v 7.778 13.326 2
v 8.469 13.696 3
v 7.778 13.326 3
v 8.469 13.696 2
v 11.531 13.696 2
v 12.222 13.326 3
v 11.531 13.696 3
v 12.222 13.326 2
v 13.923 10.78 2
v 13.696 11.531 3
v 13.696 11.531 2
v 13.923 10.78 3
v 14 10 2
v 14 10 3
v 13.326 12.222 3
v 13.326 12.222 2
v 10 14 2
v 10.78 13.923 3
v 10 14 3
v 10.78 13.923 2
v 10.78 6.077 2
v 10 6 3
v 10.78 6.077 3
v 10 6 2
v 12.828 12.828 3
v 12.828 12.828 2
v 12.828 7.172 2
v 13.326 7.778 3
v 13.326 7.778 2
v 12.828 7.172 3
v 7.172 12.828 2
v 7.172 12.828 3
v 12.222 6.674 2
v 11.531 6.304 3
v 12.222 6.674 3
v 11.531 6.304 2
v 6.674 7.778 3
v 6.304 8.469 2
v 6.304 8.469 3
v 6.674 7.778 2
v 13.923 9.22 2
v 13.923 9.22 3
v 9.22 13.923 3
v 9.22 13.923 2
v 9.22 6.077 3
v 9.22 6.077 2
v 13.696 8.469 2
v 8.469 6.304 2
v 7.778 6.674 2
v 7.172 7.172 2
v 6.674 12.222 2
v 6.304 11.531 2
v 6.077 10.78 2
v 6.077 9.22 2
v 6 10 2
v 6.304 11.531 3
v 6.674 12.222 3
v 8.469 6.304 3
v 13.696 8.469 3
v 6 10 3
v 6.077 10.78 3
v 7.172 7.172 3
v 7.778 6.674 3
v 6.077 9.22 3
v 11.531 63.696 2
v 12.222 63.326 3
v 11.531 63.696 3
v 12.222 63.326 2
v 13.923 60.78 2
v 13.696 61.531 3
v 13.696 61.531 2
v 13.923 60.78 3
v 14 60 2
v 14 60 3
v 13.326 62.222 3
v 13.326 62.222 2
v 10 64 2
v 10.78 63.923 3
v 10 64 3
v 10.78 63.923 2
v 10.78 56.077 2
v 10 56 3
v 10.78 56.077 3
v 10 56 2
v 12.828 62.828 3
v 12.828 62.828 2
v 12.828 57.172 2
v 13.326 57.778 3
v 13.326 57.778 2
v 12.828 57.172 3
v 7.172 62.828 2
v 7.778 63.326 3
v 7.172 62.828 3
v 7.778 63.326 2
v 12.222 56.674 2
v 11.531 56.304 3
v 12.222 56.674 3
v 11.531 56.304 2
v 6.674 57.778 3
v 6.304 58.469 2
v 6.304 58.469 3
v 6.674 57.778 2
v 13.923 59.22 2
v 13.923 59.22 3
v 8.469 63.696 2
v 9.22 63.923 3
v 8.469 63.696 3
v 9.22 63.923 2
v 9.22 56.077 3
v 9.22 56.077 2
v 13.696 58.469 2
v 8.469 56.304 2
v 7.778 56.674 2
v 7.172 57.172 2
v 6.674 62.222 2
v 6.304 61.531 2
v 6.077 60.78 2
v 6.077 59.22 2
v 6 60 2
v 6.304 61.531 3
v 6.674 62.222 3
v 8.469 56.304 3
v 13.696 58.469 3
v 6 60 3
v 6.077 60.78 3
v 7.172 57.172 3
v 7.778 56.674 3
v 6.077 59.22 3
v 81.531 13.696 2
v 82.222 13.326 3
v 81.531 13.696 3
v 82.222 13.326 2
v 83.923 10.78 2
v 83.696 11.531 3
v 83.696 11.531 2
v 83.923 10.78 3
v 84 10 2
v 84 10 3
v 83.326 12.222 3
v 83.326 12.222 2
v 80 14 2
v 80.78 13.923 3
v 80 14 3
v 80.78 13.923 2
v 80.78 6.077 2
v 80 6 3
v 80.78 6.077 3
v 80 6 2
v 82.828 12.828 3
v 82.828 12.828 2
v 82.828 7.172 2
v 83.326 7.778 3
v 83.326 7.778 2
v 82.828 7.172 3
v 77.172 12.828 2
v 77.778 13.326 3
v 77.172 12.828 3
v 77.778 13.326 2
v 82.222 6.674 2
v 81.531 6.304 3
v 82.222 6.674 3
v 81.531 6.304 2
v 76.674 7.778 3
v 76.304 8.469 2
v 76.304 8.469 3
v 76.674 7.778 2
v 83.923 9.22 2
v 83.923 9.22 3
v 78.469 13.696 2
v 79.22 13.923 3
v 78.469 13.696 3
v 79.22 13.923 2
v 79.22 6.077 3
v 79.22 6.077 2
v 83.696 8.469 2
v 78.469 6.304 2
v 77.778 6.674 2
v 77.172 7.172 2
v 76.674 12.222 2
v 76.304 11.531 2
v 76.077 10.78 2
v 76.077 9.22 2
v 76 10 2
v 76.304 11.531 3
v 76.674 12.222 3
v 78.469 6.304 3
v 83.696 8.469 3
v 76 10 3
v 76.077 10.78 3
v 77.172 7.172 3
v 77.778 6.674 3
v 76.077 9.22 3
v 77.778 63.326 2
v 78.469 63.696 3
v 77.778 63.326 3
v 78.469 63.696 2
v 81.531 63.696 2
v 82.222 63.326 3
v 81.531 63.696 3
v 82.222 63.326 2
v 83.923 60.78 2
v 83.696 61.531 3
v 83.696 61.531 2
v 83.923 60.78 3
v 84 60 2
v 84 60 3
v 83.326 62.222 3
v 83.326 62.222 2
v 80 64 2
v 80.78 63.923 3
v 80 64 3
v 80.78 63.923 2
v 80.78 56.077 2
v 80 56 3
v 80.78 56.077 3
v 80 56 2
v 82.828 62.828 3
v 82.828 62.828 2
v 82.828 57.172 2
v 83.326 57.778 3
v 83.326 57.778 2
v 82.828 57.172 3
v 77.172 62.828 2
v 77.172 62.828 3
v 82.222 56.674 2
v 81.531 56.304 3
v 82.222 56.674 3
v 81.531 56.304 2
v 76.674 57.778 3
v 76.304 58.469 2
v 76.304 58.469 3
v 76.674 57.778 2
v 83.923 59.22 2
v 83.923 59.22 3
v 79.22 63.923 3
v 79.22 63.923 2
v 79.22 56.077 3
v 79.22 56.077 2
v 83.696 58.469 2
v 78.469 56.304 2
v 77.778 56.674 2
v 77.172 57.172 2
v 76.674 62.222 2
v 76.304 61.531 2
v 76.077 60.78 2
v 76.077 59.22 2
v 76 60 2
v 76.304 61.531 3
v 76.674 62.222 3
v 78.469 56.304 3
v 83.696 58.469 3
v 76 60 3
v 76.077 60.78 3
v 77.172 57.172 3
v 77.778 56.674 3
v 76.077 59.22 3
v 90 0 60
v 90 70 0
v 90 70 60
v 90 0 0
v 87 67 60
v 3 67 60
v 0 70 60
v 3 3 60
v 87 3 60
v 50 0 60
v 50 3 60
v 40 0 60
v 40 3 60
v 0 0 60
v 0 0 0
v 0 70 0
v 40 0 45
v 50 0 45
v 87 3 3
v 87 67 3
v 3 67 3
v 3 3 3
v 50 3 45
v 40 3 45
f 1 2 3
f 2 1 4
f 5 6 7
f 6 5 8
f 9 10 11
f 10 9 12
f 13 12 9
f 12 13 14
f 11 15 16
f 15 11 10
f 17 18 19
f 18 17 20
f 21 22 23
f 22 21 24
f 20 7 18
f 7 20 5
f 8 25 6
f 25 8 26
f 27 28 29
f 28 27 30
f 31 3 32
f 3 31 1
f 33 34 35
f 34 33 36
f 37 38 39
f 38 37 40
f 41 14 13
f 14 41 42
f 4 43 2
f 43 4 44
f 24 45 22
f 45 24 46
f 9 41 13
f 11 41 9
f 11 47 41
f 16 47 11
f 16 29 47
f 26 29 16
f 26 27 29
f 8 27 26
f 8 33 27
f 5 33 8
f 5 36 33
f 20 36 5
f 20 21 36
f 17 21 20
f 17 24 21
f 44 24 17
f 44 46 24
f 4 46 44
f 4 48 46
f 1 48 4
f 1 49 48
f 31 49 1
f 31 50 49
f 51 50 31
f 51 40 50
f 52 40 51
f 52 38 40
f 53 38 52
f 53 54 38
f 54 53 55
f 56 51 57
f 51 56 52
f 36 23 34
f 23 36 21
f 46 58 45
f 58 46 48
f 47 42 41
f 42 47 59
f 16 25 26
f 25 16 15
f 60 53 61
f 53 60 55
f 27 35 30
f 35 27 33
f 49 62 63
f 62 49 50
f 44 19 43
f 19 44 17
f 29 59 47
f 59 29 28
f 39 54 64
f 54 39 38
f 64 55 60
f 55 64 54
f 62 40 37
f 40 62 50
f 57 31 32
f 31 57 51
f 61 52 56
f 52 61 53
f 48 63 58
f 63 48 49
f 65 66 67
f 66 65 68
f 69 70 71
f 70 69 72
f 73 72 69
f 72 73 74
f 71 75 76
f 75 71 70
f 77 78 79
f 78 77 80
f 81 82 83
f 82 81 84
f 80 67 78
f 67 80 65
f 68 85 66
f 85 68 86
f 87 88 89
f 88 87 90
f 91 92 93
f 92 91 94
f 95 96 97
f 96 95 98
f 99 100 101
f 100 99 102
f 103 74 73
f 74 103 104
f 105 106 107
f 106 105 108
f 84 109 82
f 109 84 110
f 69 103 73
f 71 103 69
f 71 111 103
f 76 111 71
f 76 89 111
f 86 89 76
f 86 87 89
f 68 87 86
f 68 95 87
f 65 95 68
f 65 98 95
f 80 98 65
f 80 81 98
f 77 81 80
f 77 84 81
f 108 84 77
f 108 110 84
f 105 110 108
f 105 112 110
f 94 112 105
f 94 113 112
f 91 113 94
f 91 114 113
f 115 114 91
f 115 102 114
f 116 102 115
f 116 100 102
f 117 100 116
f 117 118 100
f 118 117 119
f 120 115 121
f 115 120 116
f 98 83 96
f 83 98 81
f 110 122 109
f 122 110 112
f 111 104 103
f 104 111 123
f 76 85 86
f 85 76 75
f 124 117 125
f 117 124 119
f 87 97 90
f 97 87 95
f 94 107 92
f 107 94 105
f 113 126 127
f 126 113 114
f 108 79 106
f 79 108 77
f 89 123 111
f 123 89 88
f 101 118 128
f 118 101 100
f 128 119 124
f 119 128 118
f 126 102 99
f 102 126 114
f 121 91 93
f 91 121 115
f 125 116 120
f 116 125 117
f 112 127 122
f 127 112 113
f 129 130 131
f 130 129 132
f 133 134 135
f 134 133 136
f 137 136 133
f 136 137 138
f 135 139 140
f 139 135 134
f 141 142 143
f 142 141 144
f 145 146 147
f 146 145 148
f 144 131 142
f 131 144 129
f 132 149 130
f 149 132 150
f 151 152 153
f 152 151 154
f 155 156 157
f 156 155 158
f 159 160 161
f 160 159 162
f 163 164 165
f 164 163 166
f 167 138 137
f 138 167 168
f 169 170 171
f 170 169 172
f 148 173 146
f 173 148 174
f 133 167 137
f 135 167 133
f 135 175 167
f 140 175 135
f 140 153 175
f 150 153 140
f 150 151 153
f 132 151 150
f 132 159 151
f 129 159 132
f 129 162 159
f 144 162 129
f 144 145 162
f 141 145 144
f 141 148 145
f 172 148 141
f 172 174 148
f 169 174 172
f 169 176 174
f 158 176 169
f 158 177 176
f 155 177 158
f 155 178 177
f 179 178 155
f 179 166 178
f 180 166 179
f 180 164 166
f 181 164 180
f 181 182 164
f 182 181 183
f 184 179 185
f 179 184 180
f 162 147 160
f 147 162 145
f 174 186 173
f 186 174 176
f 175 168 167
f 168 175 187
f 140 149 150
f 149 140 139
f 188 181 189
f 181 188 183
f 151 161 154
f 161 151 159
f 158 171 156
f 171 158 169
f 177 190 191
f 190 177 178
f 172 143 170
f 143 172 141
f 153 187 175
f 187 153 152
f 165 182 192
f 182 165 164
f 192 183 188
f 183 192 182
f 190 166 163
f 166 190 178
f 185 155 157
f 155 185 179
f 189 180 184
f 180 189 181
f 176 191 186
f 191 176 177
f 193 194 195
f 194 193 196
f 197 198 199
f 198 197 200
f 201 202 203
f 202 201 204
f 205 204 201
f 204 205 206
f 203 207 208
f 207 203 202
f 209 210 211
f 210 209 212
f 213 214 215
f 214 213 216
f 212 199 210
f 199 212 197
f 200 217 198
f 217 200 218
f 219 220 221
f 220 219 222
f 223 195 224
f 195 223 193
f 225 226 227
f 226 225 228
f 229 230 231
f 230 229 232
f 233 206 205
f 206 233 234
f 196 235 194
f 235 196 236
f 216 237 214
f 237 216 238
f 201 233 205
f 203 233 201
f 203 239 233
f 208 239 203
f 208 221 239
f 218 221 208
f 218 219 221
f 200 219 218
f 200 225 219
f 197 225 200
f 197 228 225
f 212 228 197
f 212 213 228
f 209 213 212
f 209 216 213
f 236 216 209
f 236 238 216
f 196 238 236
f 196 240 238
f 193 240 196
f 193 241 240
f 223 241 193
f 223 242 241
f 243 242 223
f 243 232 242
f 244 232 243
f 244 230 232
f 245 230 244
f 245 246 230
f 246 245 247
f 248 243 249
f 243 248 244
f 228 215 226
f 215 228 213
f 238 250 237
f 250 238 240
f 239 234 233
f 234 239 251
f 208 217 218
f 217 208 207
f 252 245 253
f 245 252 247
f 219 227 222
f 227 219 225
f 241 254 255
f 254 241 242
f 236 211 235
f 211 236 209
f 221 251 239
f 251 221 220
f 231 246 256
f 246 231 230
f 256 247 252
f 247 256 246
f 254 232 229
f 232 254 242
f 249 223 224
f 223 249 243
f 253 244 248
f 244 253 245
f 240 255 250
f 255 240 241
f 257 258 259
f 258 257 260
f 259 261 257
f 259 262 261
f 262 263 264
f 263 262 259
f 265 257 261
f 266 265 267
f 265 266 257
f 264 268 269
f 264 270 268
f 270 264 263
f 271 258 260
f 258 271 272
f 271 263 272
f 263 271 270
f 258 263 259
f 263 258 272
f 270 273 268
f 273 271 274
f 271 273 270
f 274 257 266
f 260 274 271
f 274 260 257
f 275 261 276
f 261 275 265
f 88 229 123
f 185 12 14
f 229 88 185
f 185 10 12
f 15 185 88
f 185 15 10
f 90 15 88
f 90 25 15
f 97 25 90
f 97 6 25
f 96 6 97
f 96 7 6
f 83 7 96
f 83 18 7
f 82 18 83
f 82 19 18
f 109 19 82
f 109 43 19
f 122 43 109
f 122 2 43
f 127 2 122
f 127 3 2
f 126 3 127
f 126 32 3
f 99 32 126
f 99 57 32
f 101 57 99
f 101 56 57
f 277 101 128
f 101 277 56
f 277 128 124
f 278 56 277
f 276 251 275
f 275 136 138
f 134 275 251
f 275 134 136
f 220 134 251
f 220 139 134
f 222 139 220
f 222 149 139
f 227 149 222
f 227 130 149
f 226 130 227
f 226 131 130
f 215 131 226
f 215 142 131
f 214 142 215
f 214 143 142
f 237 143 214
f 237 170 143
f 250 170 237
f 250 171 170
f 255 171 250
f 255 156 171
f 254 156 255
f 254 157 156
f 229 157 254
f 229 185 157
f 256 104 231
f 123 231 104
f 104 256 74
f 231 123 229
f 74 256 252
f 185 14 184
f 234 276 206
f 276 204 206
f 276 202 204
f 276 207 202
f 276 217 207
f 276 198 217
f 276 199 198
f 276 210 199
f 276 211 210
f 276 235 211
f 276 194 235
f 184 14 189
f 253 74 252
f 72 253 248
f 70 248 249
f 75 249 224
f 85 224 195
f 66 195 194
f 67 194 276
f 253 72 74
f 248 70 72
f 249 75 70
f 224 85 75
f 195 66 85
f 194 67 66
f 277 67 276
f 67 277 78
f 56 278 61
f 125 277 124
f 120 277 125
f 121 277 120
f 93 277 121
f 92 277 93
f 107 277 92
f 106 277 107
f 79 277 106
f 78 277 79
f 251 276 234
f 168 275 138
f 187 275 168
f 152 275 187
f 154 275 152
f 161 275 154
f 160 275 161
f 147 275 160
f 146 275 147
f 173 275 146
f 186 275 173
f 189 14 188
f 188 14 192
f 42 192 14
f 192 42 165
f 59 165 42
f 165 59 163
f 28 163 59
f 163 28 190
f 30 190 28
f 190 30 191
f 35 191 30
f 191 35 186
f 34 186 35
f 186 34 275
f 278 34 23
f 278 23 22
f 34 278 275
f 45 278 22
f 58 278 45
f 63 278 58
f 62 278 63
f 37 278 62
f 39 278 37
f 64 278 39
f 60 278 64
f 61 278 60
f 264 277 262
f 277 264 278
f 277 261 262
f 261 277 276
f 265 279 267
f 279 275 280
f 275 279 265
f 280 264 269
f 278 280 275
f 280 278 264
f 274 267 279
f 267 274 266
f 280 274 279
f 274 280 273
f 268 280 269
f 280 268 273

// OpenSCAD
$fn = 32;

// ----------------------------------------------------------------------
// Enclosure box: both enclosure
// ----------------------------------------------------------------------

// --- parameters (mm) ---
box_l = 90;               // outer length, X
box_w = 70;               // outer width, Y
box_h = 60;               // outer height
wall_t = 3;               // wall thickness
boss_r = 4;               // corner boss radius
hole_r = 1.5;             // boss screw hole radius
boss_in = 10;             // boss inset from the corners
notch_w = 10;             // cable notch width
notch_h = 15;             // cable notch height

inner_h = box_h - wall_t;  // cavity depth
boss_h = inner_h - 2;  // corner boss height

difference() {
  cube([box_l, box_w, box_h]);
  translate([wall_t, wall_t, wall_t])
    cube([box_l - 2 * wall_t, box_w - 2 * wall_t, box_h]);
  for (sx = [0, 1], sy = [0, 1])
    translate([sx ? box_l - boss_in : boss_in,
               sy ? box_w - boss_in : boss_in, wall_t - 1]) {
      cylinder(r = boss_r, h = boss_h);
      translate([0, 0, boss_h - 4])
        cylinder(r = hole_r, h = 5);
    }
  translate([box_l / 2 - notch_w / 2, -1, box_h - notch_h])
    cube([notch_w, wall_t + 2, notch_h + 1]);
}
